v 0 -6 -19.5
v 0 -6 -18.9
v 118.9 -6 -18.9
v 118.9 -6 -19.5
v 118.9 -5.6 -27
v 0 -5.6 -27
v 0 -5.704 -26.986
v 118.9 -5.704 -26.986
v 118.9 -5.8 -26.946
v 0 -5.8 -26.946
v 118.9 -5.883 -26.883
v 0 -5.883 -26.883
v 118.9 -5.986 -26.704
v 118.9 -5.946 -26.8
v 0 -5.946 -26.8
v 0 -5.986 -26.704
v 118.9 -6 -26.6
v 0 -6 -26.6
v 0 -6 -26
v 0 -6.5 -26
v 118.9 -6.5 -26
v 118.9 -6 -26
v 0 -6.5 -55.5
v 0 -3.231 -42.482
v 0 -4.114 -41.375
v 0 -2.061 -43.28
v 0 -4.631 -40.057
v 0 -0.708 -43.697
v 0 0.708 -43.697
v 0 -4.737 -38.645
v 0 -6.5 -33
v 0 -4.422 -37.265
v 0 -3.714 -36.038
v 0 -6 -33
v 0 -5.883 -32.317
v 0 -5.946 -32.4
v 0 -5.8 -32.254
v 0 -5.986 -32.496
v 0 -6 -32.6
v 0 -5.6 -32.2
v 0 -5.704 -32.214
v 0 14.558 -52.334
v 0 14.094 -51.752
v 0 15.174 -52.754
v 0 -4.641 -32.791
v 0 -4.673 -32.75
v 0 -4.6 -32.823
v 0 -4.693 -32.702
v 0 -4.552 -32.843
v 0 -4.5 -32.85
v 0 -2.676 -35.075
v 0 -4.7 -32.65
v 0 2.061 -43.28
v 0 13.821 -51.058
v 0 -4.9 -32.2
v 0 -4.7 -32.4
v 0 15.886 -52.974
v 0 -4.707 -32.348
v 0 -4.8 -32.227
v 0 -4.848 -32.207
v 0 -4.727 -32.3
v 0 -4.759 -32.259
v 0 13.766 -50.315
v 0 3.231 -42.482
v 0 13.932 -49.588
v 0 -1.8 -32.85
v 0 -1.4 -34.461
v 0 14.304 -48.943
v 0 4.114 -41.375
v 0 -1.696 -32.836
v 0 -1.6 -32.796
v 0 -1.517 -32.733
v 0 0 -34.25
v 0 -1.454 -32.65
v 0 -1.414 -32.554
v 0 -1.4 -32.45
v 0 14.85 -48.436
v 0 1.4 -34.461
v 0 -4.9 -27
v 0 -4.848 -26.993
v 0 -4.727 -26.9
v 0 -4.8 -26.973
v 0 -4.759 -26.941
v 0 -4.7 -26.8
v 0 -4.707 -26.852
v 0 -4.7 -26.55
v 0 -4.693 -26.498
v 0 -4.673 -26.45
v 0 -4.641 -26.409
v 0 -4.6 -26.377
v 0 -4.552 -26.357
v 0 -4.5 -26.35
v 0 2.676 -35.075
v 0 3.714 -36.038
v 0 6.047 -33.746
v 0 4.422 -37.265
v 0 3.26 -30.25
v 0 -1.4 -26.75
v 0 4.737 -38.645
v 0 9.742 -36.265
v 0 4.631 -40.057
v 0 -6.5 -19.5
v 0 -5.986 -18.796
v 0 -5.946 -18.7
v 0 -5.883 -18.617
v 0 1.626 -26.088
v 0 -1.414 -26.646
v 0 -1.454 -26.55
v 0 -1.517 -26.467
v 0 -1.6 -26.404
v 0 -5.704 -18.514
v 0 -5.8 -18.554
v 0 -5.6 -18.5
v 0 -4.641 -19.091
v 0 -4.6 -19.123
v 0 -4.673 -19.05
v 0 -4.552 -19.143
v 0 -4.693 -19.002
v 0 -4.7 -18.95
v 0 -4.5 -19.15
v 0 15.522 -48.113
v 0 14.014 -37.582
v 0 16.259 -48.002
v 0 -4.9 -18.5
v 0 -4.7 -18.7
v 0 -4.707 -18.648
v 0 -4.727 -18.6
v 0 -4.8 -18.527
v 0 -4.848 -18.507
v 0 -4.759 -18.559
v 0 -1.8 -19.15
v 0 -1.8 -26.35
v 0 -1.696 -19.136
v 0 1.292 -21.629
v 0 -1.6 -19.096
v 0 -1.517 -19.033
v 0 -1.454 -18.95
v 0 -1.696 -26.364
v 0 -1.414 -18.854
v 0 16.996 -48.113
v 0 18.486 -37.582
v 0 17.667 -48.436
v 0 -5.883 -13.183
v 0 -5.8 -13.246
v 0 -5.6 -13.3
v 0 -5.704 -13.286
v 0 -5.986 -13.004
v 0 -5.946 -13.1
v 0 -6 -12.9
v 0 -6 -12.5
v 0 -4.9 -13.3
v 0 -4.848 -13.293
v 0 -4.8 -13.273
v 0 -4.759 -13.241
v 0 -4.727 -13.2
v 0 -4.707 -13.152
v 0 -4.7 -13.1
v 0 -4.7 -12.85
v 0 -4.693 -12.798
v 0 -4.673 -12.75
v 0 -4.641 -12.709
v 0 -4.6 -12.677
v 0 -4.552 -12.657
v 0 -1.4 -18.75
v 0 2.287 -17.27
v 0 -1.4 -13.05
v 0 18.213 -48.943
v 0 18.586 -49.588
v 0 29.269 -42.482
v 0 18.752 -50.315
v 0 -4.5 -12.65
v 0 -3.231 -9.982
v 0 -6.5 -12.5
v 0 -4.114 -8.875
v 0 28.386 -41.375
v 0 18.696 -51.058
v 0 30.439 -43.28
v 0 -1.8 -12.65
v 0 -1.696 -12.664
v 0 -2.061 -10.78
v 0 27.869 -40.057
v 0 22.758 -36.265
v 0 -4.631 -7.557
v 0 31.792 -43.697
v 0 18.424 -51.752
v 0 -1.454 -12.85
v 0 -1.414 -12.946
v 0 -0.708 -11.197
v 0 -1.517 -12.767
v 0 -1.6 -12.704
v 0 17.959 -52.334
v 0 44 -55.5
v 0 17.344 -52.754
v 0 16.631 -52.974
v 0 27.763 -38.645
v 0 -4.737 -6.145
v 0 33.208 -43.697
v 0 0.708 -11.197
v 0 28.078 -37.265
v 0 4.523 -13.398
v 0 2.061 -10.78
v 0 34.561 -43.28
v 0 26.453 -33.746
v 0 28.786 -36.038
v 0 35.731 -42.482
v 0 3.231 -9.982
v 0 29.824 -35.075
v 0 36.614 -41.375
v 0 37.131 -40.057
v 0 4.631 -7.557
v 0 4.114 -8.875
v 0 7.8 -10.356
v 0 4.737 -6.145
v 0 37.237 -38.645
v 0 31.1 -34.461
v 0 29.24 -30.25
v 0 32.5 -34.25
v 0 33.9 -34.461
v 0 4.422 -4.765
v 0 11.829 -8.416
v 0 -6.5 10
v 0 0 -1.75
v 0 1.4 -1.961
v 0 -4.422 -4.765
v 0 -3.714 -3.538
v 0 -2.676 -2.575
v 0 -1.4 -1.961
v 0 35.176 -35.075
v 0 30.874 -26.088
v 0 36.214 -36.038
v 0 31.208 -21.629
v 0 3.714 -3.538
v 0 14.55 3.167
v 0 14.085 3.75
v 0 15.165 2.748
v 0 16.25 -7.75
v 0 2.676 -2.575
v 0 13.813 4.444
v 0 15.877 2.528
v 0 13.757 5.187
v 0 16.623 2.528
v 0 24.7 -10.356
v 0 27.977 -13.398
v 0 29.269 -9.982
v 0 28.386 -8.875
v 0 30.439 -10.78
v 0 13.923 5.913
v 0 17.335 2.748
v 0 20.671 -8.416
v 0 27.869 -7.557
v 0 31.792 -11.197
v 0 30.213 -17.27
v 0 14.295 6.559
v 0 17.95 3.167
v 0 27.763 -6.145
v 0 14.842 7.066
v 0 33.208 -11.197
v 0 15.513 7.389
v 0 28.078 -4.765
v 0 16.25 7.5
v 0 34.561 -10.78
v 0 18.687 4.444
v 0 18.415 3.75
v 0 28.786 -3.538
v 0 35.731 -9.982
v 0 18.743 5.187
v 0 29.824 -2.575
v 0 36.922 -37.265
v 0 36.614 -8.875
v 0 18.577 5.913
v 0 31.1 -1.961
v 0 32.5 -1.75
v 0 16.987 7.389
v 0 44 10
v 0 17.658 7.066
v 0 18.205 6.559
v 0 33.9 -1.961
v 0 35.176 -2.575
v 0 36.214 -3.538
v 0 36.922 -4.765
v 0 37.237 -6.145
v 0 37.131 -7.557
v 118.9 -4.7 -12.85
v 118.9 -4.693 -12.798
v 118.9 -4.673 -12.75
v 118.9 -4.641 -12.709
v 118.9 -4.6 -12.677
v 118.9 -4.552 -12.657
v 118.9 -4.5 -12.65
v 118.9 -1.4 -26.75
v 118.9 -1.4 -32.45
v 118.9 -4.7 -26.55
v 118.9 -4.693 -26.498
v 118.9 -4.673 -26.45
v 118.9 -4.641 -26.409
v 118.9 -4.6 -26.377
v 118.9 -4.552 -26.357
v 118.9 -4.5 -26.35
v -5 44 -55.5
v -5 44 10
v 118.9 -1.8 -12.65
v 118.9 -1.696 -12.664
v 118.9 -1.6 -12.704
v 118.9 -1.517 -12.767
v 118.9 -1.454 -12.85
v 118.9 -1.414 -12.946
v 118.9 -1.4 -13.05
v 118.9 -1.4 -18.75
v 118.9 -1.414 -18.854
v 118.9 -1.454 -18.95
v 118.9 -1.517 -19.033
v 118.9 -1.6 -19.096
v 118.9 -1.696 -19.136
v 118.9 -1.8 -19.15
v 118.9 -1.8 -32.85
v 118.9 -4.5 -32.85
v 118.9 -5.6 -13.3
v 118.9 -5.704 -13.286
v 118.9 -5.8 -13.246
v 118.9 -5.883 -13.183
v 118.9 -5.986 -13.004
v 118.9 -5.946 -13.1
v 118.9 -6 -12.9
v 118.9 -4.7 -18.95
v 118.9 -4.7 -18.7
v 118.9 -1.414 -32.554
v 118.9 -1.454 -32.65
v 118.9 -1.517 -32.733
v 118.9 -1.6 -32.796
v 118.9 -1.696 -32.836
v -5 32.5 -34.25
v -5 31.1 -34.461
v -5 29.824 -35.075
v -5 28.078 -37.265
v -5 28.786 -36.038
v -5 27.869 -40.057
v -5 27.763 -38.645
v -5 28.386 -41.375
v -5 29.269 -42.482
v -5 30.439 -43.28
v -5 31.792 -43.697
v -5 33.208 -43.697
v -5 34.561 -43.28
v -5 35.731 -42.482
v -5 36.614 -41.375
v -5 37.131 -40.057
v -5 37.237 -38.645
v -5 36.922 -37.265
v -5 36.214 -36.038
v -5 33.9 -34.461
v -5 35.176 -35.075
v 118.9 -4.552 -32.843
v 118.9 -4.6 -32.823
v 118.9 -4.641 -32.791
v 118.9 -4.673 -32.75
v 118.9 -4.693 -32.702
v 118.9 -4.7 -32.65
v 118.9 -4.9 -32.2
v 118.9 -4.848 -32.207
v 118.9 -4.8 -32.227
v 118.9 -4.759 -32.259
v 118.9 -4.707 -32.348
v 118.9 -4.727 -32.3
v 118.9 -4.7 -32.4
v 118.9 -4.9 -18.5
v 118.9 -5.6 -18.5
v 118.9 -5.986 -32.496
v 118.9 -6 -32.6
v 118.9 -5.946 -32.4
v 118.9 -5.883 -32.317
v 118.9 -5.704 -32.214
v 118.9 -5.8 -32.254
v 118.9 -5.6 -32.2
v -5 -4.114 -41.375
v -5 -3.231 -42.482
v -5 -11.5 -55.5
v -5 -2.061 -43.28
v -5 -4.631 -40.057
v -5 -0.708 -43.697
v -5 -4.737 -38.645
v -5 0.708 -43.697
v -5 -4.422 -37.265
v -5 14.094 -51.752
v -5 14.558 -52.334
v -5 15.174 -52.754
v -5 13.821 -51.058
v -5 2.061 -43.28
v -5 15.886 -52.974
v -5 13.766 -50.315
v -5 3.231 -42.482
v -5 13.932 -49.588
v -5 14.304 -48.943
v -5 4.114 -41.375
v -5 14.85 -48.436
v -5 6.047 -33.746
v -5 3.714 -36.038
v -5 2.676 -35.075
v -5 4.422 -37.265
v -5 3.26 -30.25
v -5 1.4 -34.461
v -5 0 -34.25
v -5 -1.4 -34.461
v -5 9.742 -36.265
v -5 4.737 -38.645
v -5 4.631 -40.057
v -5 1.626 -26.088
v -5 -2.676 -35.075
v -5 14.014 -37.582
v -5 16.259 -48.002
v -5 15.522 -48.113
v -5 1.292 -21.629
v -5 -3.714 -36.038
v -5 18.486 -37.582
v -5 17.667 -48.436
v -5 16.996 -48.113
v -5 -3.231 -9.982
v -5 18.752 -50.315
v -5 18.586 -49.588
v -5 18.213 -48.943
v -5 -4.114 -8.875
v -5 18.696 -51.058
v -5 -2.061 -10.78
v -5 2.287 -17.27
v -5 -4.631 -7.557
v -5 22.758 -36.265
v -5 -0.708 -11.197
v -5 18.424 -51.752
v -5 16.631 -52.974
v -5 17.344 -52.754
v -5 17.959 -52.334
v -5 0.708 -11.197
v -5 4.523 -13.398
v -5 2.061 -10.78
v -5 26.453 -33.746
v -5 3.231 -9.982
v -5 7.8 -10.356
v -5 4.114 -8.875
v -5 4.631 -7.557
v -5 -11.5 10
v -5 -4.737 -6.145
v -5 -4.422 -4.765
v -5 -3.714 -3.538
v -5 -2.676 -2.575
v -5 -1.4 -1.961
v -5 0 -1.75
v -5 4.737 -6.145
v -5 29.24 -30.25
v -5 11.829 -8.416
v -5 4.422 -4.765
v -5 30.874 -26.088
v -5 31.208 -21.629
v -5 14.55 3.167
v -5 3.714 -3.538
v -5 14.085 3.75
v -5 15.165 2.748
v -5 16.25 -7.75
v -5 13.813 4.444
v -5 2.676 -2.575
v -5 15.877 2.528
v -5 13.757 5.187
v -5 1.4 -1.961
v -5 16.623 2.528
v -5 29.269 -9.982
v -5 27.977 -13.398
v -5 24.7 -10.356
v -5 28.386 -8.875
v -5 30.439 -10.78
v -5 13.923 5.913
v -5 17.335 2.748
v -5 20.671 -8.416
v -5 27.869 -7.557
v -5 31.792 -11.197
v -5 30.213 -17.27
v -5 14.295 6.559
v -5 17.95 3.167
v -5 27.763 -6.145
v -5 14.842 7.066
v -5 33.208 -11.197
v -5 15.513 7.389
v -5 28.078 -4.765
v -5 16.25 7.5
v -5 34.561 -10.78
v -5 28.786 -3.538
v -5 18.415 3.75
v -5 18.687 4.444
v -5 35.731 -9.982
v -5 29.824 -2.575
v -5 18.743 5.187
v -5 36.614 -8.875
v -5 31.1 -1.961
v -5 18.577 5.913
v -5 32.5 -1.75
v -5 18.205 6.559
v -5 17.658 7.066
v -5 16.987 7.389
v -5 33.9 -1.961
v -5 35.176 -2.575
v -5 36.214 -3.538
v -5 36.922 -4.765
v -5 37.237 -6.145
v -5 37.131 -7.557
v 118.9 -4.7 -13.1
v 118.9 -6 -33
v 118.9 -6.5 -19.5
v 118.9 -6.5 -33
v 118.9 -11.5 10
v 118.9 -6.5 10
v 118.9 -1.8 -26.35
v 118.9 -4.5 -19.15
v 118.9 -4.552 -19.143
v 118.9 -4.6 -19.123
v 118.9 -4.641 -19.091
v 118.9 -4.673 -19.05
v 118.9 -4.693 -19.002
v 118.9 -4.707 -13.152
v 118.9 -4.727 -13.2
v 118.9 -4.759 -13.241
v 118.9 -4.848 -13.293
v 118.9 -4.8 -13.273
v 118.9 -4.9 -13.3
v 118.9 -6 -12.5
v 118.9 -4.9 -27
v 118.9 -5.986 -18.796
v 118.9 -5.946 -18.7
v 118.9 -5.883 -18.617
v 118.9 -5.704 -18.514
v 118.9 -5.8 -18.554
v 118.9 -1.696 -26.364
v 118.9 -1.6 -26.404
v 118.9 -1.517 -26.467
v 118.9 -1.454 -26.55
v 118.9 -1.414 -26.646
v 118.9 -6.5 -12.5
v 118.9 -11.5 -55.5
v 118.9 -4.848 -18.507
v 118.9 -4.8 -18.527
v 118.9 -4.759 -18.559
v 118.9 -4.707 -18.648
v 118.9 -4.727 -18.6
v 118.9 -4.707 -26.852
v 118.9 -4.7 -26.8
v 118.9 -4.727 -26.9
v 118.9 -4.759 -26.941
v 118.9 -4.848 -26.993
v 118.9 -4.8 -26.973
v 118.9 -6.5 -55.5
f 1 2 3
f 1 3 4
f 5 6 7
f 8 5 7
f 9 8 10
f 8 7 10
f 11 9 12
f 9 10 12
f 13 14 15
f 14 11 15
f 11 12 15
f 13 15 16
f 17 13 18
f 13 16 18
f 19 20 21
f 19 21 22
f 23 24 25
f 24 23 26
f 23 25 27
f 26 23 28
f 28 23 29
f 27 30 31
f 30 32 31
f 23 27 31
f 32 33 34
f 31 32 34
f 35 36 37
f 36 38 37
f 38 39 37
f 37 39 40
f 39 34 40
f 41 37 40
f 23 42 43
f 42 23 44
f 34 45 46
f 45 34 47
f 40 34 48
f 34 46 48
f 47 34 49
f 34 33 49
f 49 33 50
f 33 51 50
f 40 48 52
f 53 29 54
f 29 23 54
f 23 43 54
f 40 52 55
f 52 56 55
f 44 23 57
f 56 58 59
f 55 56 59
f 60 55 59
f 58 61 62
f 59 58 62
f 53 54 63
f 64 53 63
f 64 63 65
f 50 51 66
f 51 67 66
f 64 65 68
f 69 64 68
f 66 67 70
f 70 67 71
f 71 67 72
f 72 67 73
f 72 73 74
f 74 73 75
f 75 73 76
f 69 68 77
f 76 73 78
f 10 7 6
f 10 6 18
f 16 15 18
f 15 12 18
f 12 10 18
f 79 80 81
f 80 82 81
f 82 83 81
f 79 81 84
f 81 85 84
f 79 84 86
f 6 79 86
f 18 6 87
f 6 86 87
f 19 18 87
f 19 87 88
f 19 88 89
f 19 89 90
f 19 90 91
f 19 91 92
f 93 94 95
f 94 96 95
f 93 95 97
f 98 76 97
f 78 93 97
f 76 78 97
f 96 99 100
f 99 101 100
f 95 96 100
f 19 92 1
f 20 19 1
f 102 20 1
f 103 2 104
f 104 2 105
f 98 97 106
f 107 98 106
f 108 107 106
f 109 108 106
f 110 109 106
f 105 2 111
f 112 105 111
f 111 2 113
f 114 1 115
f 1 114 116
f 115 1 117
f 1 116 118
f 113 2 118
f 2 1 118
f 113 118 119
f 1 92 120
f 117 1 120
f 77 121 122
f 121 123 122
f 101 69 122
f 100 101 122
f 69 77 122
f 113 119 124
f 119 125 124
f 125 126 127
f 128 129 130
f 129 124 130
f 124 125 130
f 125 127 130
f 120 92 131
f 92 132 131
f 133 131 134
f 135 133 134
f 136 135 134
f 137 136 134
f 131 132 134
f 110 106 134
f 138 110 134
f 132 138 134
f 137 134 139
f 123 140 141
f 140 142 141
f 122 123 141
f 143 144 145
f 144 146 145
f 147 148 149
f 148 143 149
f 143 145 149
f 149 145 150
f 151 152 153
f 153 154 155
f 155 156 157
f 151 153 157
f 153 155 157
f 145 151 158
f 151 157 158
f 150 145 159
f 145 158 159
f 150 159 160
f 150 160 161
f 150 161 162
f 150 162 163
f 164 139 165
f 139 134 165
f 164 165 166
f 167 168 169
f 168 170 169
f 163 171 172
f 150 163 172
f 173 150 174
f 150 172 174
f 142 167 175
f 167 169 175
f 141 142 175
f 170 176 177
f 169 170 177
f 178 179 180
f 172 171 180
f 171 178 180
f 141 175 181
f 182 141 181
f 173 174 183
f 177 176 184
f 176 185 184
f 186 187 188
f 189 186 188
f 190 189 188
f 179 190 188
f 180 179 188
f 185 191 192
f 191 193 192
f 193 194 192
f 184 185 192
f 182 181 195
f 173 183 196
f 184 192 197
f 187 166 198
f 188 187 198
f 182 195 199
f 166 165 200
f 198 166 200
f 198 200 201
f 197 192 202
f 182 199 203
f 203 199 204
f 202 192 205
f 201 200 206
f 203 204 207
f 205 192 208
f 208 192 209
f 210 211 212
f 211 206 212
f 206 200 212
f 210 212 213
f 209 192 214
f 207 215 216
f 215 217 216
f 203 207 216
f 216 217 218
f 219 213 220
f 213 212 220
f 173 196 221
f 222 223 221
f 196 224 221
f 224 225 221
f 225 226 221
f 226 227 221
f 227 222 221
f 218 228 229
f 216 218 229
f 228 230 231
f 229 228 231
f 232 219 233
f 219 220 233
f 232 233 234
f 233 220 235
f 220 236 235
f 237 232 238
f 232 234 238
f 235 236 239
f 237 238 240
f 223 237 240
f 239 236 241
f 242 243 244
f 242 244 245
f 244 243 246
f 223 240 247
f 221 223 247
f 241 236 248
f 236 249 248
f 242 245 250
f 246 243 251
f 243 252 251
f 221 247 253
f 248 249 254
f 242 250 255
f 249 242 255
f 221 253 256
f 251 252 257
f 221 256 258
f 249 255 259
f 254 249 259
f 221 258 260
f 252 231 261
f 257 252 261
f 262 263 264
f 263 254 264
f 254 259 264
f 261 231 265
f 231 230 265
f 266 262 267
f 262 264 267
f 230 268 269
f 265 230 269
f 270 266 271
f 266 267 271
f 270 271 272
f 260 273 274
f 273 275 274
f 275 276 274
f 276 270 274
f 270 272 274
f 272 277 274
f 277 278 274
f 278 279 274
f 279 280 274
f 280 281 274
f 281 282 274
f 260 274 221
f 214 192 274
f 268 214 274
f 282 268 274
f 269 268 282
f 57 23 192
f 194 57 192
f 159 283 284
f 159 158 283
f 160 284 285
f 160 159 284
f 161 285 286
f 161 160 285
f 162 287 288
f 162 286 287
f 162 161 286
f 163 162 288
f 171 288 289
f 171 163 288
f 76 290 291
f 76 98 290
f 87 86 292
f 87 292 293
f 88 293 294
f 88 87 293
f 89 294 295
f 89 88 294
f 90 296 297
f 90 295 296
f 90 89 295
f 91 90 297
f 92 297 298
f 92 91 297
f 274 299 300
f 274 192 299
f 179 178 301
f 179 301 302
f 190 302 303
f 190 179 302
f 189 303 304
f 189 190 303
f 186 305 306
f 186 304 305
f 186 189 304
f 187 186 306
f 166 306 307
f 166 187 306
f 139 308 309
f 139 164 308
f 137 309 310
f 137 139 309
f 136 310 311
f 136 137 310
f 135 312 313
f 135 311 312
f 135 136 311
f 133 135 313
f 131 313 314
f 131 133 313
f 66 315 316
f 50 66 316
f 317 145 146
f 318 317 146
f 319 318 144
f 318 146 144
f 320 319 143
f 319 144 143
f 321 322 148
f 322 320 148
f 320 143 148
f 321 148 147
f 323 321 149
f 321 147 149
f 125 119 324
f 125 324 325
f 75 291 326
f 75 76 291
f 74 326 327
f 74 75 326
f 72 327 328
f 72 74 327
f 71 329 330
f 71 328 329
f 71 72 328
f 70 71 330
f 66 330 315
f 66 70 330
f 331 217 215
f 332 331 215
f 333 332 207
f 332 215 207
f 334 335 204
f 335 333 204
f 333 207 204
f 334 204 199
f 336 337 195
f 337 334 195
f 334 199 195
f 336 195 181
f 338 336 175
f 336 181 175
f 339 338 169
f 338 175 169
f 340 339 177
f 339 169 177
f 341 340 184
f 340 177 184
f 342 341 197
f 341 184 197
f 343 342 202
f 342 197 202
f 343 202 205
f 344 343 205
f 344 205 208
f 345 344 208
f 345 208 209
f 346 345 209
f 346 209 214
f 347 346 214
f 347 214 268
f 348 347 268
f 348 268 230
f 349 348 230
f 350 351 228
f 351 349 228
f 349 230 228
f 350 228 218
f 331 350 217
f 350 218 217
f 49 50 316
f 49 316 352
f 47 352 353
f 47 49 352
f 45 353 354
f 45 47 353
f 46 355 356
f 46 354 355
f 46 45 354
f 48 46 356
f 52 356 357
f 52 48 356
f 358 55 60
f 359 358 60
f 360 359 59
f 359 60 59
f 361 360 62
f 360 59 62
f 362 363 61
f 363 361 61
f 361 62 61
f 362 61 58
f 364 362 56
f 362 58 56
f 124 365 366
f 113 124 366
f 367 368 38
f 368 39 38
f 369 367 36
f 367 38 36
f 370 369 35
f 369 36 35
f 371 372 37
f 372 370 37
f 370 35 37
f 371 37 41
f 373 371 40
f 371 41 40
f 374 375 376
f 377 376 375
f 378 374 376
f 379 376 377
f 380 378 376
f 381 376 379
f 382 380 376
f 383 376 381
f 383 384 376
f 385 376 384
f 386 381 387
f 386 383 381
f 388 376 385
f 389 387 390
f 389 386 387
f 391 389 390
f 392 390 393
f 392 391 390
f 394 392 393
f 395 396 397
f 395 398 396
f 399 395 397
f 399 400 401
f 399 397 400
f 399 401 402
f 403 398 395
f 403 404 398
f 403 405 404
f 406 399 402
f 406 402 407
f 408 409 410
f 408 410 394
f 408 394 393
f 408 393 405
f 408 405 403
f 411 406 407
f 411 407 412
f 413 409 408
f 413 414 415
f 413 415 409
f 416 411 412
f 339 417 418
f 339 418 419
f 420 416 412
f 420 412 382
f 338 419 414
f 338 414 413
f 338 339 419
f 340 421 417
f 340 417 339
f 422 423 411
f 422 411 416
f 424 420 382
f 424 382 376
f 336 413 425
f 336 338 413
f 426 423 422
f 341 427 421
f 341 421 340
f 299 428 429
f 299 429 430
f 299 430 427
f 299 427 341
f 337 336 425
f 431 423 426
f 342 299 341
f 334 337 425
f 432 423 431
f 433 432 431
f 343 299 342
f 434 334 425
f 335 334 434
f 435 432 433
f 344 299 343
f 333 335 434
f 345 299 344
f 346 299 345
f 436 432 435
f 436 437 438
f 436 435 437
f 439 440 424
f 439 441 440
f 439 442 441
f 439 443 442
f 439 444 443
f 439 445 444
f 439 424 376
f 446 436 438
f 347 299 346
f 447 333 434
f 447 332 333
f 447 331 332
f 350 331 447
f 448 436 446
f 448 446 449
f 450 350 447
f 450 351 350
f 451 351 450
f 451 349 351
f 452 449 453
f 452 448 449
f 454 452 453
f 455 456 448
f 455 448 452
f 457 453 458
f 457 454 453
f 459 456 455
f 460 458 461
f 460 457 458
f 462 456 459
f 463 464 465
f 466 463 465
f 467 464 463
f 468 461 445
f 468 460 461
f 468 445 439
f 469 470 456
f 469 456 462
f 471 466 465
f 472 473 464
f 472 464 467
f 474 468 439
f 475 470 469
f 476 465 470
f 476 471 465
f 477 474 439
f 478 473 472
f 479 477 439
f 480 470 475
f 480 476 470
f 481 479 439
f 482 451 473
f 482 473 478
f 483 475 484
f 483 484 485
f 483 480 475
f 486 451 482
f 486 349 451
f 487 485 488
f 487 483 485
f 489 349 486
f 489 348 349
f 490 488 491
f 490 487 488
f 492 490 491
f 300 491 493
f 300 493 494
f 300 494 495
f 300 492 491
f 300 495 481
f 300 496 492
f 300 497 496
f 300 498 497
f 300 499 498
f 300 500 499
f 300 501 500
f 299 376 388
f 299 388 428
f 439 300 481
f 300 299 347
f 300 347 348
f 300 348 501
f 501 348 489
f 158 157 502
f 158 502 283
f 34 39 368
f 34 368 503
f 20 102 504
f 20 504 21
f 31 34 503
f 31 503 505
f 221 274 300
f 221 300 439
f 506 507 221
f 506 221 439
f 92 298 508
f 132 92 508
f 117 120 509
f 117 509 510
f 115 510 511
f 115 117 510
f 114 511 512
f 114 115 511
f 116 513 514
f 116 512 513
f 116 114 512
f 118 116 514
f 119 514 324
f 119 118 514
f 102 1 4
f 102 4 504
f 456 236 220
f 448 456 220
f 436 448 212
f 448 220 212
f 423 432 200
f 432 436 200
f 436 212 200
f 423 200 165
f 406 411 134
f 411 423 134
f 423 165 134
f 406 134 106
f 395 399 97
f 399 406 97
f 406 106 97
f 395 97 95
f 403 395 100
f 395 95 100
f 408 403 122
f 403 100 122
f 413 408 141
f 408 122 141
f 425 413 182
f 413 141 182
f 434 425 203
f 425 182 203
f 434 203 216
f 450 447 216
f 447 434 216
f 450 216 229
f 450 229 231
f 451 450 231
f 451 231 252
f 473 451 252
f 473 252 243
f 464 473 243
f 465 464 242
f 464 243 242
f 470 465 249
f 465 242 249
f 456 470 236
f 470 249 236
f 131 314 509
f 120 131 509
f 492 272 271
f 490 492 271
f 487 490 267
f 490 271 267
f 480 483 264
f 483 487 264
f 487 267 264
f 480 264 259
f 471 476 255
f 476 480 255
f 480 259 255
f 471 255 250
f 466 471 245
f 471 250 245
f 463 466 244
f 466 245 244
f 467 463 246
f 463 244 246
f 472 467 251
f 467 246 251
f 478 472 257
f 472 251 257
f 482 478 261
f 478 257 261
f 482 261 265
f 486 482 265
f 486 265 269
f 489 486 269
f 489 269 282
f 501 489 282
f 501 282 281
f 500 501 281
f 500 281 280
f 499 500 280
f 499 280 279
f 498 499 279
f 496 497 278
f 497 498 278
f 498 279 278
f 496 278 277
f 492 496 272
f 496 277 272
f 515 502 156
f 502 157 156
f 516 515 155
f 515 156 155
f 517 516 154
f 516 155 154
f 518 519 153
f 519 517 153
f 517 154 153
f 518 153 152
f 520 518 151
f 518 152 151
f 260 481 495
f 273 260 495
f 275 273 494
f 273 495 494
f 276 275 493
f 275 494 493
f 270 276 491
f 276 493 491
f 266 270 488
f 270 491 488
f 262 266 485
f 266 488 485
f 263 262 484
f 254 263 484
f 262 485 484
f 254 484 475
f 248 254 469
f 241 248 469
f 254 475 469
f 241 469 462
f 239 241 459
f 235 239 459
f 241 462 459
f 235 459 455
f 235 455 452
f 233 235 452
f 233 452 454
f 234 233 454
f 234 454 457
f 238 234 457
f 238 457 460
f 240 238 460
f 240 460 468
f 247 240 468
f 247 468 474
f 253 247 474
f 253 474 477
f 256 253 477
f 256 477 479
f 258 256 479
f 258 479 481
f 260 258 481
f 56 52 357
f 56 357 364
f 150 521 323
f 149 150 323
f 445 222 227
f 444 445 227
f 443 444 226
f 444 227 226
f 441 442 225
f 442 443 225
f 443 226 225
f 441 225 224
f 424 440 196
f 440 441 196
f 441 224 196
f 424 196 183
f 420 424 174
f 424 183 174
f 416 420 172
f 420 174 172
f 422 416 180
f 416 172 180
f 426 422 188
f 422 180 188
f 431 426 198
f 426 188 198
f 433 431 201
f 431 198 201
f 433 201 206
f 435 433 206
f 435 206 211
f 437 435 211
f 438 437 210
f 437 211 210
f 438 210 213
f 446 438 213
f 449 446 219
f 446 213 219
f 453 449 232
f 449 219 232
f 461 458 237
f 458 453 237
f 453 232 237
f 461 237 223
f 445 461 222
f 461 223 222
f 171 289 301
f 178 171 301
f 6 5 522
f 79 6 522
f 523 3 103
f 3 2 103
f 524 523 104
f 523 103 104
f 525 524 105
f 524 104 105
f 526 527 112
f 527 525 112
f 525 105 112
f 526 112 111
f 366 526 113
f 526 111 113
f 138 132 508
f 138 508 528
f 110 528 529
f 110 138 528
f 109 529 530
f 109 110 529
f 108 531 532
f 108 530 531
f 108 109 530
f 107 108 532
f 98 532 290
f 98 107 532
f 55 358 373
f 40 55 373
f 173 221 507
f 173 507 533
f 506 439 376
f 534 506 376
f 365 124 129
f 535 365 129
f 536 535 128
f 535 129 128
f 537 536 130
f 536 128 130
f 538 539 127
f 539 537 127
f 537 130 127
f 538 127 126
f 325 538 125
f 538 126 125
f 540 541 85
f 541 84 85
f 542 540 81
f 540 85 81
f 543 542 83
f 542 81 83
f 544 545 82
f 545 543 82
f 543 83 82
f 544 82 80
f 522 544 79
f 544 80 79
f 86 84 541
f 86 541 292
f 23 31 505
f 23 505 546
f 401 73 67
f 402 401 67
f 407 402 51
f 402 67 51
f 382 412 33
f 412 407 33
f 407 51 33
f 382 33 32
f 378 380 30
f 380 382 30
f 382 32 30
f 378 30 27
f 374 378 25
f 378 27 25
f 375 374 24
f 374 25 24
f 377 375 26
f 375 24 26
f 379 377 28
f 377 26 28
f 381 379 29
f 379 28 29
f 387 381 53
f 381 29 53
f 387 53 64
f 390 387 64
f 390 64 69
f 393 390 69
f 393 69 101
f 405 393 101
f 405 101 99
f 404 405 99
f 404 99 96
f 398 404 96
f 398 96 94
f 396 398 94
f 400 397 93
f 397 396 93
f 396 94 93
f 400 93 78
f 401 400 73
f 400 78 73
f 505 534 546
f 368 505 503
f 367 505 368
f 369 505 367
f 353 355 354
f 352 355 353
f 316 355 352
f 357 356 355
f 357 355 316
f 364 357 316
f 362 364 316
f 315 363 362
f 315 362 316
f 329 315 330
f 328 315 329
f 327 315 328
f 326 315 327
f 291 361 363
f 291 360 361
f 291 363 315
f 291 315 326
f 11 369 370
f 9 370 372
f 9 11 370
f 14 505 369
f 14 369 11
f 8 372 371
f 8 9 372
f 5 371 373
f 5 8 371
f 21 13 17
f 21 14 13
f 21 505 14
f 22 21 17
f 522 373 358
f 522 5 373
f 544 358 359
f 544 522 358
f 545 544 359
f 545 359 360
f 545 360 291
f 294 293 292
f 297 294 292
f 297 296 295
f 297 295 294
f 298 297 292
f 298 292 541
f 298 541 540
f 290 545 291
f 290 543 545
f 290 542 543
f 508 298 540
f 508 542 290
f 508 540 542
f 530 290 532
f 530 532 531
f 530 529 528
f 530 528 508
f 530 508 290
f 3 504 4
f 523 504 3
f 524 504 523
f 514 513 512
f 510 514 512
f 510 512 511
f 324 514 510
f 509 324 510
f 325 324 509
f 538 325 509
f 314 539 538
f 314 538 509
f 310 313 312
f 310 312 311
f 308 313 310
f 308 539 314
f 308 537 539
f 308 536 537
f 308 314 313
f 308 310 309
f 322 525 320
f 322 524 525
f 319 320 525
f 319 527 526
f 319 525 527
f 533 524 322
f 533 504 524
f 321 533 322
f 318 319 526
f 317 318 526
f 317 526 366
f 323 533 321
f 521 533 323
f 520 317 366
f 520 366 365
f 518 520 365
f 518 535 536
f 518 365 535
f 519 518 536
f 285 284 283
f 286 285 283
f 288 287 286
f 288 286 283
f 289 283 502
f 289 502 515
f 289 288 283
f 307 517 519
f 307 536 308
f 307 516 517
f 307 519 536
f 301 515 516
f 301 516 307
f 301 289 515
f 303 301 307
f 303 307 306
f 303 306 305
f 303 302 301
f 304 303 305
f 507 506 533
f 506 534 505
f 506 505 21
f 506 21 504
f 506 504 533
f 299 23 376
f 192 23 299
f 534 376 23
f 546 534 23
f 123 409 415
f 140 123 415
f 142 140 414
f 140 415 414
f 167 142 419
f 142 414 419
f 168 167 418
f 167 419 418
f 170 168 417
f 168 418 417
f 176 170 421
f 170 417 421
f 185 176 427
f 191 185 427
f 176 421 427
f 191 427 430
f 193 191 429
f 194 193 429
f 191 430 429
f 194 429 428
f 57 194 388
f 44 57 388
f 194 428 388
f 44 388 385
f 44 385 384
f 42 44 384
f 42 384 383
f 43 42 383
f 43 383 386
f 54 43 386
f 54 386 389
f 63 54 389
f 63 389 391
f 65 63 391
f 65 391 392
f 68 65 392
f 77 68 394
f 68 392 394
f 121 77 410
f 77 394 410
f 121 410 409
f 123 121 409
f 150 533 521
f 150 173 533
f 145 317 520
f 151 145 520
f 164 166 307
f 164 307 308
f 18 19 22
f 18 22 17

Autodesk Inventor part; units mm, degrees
ref_plane "YZ Plane" through (0, 0, 0) normal (1, 0, 0) x (0, 1, 0)
ref_plane "XZ Plane" through (0, 0, 0) normal (0, 1, 0) x (-1, 0, 0)
ref_plane "XY Plane" through (0, 0, 0) normal (0, 0, 1) x (1, 0, 0)
sketch "Sketch4" plane through (0, 0, 0) normal (1, 0, 0) x (0, 1, 0)
  line L0 (-6, -12.5) -> (-6, -12.9)
  arc A0 (-6, -12.9) -> (-5.6, -13.3) centre (-5.6, -12.9) ccw
  line L1 (-5.6, -13.3) -> (-4.9, -13.3)
  arc A1 (-4.9, -13.3) -> (-4.7, -13.1) centre (-4.9, -13.1) ccw
  line L2 (-4.7, -13.1) -> (-4.7, -12.85)
  arc A2 (-4.5, -12.65) -> (-4.7, -12.85) centre (-4.5, -12.85) ccw
  line L3 (-4.5, -12.65) -> (-1.8, -12.65)
  arc A3 (-1.4, -13.05) -> (-1.8, -12.65) centre (-1.8, -13.05) ccw
  line L4 (-1.4, -13.05) -> (-1.4, -18.75)
  line L5 (-1.8, -19.15) -> (-4.5, -19.15)
  arc A4 (-1.8, -19.15) -> (-1.4, -18.75) centre (-1.8, -18.75) ccw
  arc A5 (-4.7, -18.95) -> (-4.5, -19.15) centre (-4.5, -18.95) ccw
  line L6 (-4.7, -18.95) -> (-4.7, -18.7)
  arc A6 (-4.7, -18.7) -> (-4.9, -18.5) centre (-4.9, -18.7) ccw
  line L7 (-4.9, -18.5) -> (-5.6, -18.5)
  arc A7 (-5.6, -18.5) -> (-6, -18.9) centre (-5.6, -18.9) ccw
  line L8 (-6, -18.9) -> (-6, -19.5)
  line L9 (-6.5, -6.5) -> (-6.5, -12.5)
  line L10 (-6.5, -12.5) -> (-6, -12.5)
  line L11 (-6, -19.5) -> (-6.5, -19.5)
  line L12 (-6.5, -19.5) -> (-6.5, -26)
  line L13 (-6.5, -26) -> (-6, -26)
  line L14 (-6, -26) -> (-6, -26.6)
  arc A8 (-6, -26.6) -> (-5.6, -27) centre (-5.6, -26.6) ccw
  line L15 (-5.6, -27) -> (-4.9, -27)
  arc A9 (-4.9, -27) -> (-4.7, -26.8) centre (-4.9, -26.8) ccw
  arc A10 (-4.5, -26.35) -> (-4.7, -26.55) centre (-4.5, -26.55) ccw
  line L16 (-4.7, -26.8) -> (-4.7, -26.55)
  line L17 (-4.5, -26.35) -> (-1.8, -26.35)
  arc A11 (-1.4, -26.75) -> (-1.8, -26.35) centre (-1.8, -26.75) ccw
  line L18 (-1.4, -26.75) -> (-1.4, -32.45)
  arc A12 (-1.8, -32.85) -> (-1.4, -32.45) centre (-1.8, -32.45) ccw
  line L19 (-1.8, -32.85) -> (-4.5, -32.85)
  arc A13 (-4.7, -32.65) -> (-4.5, -32.85) centre (-4.5, -32.65) ccw
  line L20 (-4.7, -32.65) -> (-4.7, -32.4)
  arc A14 (-4.7, -32.4) -> (-4.9, -32.2) centre (-4.9, -32.4) ccw
  line L21 (-4.9, -32.2) -> (-5.6, -32.2)
  arc A15 (-5.6, -32.2) -> (-6, -32.6) centre (-5.6, -32.6) ccw
  line L22 (-6, -32.6) -> (-6, -33)
  line L23 (-6, -33) -> (-6.5, -33)
  line L24 (-6.5, -33) -> (-6.5, -39)
  circle A16 centre (0, -6.5) radius 4.75
  circle A17 centre (32.5, -6.5) radius 4.75
  circle A18 centre (0, -39) radius 4.75
  circle A19 centre (32.5, -39) radius 4.75
  line L25 (39, -26) -> (39, -19.5)
  line L26 (39, -12.5) -> (39, -6.5)
  line L27 (39, -39) -> (39, -33)
  line L28 (39, -45.5) -> (39, 0)
  line L29 (39, -45.5) -> (39, -55.5)
  line L30 (39, -55.5) -> (-6.5, -55.5)
  line L31 (-6.5, -55.5) -> (-6.5, -45.5)
  line L32 (39, 0) -> (39, 10)
  line L33 (39, 10) -> (-6.5, 10)
  line L34 (-6.5, 10) -> (-6.5, 0)
  line L35 (-6.5, 0) -> (-6.5, -12.5)
  line L36 (-6.5, -19.5) -> (-6.5, -26)
  line L37 (-6.5, -33) -> (-6.5, -45.5)
  line L38 (-6.5, 10) -> (-11.5, 10)
  line L39 (-11.5, 10) -> (-11.5, -55.5)
  line L40 (-11.5, -55.5) -> (-6.5, -55.5)
  line L41 (-6.5, -12.5) -> (-6.5, 10)
  line L42 (-6.5, -55.5) -> (-6.5, -33)
  line L43 (-6.5, -26) -> (-6.5, -19.5)
  point P0 (0, 0)
  dimension "d36" = 10
  dimension "d37" = 10
  dimension "d38" = 5
extrude "Extrusion6" add sketch "Sketch4" along normal blind 118.9 contours L0 A0 L1 A1 L2 A2 L3 A3 L4 A4 L5 A5 L6 A6 L7 A7 L8 L11 L12 L13 L14 A8 L15 A9 L16 A10 L17 A11 L18 A12 L19 A13 L20 A14 L21 A15 L22 L23 L24 L37 L31 L40 L39 L38 L34 L35 L9 L10
sketch "Sketch5" plane through (0, 0, 0) normal (-1, 0, 0) x (0, 0, 1)
  line L0 (-33, -6) -> (-32.6, -6)
  arc A0 (-32.6, -6) -> (-32.2, -5.6) centre (-32.6, -5.6) ccw
  line L1 (-32.2, -5.6) -> (-32.2, -4.9)
  arc A1 (-32.2, -4.9) -> (-32.4, -4.7) centre (-32.4, -4.9) ccw
  line L2 (-32.4, -4.7) -> (-32.65, -4.7)
  arc A2 (-32.85, -4.5) -> (-32.65, -4.7) centre (-32.65, -4.5) ccw
  line L3 (-32.85, -4.5) -> (-32.85, -1.8)
  arc A3 (-32.45, -1.4) -> (-32.85, -1.8) centre (-32.45, -1.8) ccw
  line L4 (-32.45, -1.4) -> (-26.75, -1.4)
  line L5 (-26.35, -1.8) -> (-26.35, -4.5)
  arc A4 (-26.35, -1.8) -> (-26.75, -1.4) centre (-26.75, -1.8) ccw
  arc A5 (-26.55, -4.7) -> (-26.35, -4.5) centre (-26.55, -4.5) ccw
  line L6 (-26.55, -4.7) -> (-26.8, -4.7)
  arc A6 (-26.8, -4.7) -> (-27, -4.9) centre (-26.8, -4.9) ccw
  line L7 (-27, -4.9) -> (-27, -5.6)
  arc A7 (-27, -5.6) -> (-26.6, -6) centre (-26.6, -5.6) ccw
  line L8 (-26.6, -6) -> (-26, -6)
  line L9 (-39, -6.5) -> (-33, -6.5)
  line L10 (-33, -6.5) -> (-33, -2.5)
  line L11 (-26, -1.05) -> (-26, -6.5)
  line L12 (-26, -6.5) -> (-19.5, -6.5)
  line L13 (-19.5, -6.5) -> (-19.5, -1.05)
  line L14 (-19.5, -6) -> (-18.9, -6)
  arc A8 (-18.9, -6) -> (-18.5, -5.6) centre (-18.9, -5.6) ccw
  line L15 (-18.5, -5.6) -> (-18.5, -4.9)
  arc A9 (-18.5, -4.9) -> (-18.7, -4.7) centre (-18.7, -4.9) ccw
  arc A10 (-19.15, -4.5) -> (-18.95, -4.7) centre (-18.95, -4.5) ccw
  line L16 (-18.7, -4.7) -> (-18.95, -4.7)
  line L17 (-19.15, -4.5) -> (-19.15, -1.8)
  arc A11 (-18.75, -1.4) -> (-19.15, -1.8) centre (-18.75, -1.8) ccw
  line L18 (-18.75, -1.4) -> (-13.05, -1.4)
  arc A12 (-12.65, -1.8) -> (-13.05, -1.4) centre (-13.05, -1.8) ccw
  line L19 (-12.65, -1.8) -> (-12.65, -4.5)
  arc A13 (-12.85, -4.7) -> (-12.65, -4.5) centre (-12.85, -4.5) ccw
  line L20 (-12.85, -4.7) -> (-13.1, -4.7)
  arc A14 (-13.1, -4.7) -> (-13.3, -4.9) centre (-13.1, -4.9) ccw
  line L21 (-13.3, -4.9) -> (-13.3, -5.6)
  arc A15 (-13.3, -5.6) -> (-12.9, -6) centre (-12.9, -5.6) ccw
  line L22 (-12.9, -6) -> (-12.5, -6)
  line L23 (-12.5, -2.5) -> (-12.5, -6.5)
  line L24 (-12.5, -6.5) -> (-6.5, -6.5)
  line L25 (-45.5, 32.5) -> (-45.5, 0)
  circle A16 centre (-39, 0) radius 4.75
  circle A17 centre (-39, 32.5) radius 4.75
  circle A18 centre (-6.5, 0) radius 4.75
  circle A19 centre (-6.5, 32.5) radius 4.75
  line L26 (-19.5, 39) -> (-26, 39)
  line L27 (-33, 39) -> (-39, 39)
  line L28 (-6.5, 39) -> (-12.5, 39)
  line L29 (0, 26.5) -> (0, 32.5)
  line L30 (0, 0) -> (0, 6)
  line L31 (0, 13) -> (0, 19.5)
  circle A20 centre (-22.75, 16.25) radius 15
  line L32 (-12.5, -6) -> (-12.5, -6.5) projected
  line L33 (10, -11.5) -> (-55.5, -11.5) projected
  line L34 (10, -11.5) -> (-55.5, -11.5)
  line L35 (-55.5, -11.5) -> (-55.5, 44)
  line L36 (-55.5, 44) -> (10, 44)
  line L37 (10, 44) -> (10, -11.5)
  line L38 (10, 39) -> (10, 44)
  point P0 (0, 0)
  point P1 (-55.5, -11.5)
  dimension "d43" = 5
extrude "Extrusion7" add sketch "Sketch5" along normal blind 5
sketch "Sketch7" plane through (-5, 0, 0) normal (-1, 0, 0) x (0, 0, 1)
  line L0 (10, -11.5) -> (10, 44) projected
  line L1 (10, 44) -> (0, -11.5)
  line L2 (-55.5, -11.5) -> (10, -11.5) projected
  line L3 (10, -11.5) -> (0, 44)
  line L4 (10, 44) -> (-55.5, 44) projected
  line L5 (-55.5, 44) -> (-55.5, -11.5) projected
  line L6 (-55.5, -10.3017) -> (-45.7159, 44)
  line L7 (-45.7159, 44) -> (-55.5, 44)
  line L8 (-55.5, 44) -> (-45.5032, -11.4823)
  circle A0 centre (5, 16.25) radius 2.5
  circle A1 centre (-50.5016, 16.2588) radius 2.5
  point P0 (0, 0)
  dimension "d44" = 5
  dimension "d45" = 5
extrude "Extrusion8" cut sketch "Sketch7" against normal through all contours A0 L1 L3 | L3 L1 A0 | L1 L3 A0 | A0 L3 L1 | A1 L8 L6 | L6 L8 A1 | A1 L8 L6 | L6 L8 A1
properties part number "SoporteHidráhulicos_CPY" material "Steel, Mild, Welded"
